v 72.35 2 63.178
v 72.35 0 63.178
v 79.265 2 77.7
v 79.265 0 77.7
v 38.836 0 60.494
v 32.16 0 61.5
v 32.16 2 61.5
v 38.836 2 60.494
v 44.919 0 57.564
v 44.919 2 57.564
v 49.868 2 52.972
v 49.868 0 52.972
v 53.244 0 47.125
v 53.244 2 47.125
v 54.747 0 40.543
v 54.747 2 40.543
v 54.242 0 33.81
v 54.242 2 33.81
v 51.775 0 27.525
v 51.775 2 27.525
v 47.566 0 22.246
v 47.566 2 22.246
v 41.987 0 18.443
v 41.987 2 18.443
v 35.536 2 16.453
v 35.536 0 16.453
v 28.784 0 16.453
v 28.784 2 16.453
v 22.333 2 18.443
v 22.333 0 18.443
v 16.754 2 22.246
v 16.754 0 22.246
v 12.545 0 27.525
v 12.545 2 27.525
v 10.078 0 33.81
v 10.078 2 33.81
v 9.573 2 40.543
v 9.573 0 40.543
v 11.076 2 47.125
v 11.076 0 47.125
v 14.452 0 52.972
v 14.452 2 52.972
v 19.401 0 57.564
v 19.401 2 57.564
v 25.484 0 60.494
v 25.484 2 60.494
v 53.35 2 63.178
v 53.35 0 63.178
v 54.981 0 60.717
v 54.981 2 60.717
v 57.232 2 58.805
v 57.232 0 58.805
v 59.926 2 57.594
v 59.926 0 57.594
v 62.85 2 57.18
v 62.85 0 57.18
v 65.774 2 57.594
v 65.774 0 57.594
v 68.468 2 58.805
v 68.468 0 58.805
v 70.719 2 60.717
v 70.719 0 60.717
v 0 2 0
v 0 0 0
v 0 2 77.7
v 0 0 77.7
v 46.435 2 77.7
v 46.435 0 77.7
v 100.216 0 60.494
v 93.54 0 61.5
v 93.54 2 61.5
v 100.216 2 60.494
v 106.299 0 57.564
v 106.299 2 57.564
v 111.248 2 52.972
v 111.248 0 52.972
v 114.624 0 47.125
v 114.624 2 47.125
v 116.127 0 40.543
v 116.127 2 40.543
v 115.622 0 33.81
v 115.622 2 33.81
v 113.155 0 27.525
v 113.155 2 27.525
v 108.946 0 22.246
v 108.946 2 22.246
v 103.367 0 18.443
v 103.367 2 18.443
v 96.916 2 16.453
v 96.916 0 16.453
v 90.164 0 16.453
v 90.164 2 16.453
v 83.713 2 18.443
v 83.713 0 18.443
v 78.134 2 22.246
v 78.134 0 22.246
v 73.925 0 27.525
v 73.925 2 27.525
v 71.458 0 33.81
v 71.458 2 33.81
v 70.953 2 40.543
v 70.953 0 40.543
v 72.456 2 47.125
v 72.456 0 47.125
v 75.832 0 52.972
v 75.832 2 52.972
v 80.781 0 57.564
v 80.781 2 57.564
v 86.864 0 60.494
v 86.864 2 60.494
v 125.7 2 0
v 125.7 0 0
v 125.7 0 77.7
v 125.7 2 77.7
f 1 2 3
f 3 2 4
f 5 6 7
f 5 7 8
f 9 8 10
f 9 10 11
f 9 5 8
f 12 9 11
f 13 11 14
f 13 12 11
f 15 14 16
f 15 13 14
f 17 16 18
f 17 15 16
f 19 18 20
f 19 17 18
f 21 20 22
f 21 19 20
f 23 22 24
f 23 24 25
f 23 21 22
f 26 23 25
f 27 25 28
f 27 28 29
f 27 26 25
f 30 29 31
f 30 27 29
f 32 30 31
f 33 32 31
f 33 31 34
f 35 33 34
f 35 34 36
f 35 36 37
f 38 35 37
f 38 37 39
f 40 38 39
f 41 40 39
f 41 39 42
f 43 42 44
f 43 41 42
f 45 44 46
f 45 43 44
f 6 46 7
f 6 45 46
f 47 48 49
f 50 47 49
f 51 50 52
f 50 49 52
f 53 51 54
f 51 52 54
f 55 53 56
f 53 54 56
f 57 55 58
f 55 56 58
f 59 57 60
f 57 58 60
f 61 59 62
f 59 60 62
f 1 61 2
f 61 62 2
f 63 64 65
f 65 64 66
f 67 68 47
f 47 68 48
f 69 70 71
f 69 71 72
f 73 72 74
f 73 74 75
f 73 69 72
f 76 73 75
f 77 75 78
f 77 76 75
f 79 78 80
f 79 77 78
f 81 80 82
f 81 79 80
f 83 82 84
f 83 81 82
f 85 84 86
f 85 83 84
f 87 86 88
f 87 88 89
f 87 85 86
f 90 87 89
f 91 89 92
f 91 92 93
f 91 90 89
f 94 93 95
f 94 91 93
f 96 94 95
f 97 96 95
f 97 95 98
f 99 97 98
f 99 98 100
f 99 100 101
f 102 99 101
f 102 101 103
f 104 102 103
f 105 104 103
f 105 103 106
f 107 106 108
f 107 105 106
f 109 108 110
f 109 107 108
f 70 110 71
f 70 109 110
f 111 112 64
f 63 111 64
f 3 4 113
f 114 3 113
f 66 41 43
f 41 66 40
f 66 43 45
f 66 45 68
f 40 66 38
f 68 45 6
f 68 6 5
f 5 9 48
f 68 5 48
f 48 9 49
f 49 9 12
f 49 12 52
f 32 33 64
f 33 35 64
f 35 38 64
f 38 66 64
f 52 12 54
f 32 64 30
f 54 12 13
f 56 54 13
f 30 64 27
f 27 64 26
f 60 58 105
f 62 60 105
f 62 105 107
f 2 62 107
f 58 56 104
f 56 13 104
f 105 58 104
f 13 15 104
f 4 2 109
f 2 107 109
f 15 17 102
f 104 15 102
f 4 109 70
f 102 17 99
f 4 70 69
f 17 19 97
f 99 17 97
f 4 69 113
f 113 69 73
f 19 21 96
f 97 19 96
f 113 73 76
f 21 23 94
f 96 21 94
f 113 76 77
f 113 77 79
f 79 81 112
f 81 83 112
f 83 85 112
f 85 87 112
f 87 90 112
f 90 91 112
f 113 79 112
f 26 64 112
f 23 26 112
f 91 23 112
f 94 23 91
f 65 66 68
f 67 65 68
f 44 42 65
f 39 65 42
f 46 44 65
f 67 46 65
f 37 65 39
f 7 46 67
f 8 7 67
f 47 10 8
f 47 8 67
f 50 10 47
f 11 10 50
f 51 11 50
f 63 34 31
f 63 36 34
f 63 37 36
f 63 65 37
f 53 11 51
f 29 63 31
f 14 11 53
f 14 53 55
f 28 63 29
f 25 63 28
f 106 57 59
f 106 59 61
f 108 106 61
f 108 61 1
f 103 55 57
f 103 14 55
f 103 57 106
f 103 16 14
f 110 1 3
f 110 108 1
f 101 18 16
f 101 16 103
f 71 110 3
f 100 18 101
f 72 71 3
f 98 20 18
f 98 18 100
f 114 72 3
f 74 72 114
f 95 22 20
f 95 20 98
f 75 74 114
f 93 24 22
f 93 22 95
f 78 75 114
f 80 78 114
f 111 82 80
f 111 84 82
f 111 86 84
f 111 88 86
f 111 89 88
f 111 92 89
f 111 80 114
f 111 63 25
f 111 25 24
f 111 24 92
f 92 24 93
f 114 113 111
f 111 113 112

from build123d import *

# Parameters (mm, degrees)
SKETCH_1_R      = 22.65
EXTRUDE_1_DEPTH = 2


with BuildPart() as part:
    # 草图1 → 凸台-拉伸1 (new body)
    with BuildSketch(Plane(origin=(0, 0, 0), x_dir=(1, 0, 0), z_dir=(0, 1, 0))):
        with BuildLine():
            Line((0, -77.7), (46.435, -77.7))
            Line((46.435, -77.7), (53.35, -63.178332735))
            ThreePointArc((53.35, -63.178332735), (62.85, -57.18), (72.35, -63.178332735))
            Line((72.35, -63.178332735), (79.265, -77.7))
            Line((79.265, -77.7), (125.7, -77.7))
            Line((125.7, -77.7), (125.7, 0))
            Line((125.7, 0), (0, 0))
            Line((0, 0), (0, -77.7))
        make_face()
        with Locations(Location((32.16, -38.85, 0), (0, 0, 270))):
            Circle(SKETCH_1_R, mode=Mode.SUBTRACT)
        with Locations(Location((93.54, -38.85, 0), (0, 0, 270))):
            Circle(SKETCH_1_R, mode=Mode.SUBTRACT)
    extrude(amount=EXTRUDE_1_DEPTH)


solid = part.part
